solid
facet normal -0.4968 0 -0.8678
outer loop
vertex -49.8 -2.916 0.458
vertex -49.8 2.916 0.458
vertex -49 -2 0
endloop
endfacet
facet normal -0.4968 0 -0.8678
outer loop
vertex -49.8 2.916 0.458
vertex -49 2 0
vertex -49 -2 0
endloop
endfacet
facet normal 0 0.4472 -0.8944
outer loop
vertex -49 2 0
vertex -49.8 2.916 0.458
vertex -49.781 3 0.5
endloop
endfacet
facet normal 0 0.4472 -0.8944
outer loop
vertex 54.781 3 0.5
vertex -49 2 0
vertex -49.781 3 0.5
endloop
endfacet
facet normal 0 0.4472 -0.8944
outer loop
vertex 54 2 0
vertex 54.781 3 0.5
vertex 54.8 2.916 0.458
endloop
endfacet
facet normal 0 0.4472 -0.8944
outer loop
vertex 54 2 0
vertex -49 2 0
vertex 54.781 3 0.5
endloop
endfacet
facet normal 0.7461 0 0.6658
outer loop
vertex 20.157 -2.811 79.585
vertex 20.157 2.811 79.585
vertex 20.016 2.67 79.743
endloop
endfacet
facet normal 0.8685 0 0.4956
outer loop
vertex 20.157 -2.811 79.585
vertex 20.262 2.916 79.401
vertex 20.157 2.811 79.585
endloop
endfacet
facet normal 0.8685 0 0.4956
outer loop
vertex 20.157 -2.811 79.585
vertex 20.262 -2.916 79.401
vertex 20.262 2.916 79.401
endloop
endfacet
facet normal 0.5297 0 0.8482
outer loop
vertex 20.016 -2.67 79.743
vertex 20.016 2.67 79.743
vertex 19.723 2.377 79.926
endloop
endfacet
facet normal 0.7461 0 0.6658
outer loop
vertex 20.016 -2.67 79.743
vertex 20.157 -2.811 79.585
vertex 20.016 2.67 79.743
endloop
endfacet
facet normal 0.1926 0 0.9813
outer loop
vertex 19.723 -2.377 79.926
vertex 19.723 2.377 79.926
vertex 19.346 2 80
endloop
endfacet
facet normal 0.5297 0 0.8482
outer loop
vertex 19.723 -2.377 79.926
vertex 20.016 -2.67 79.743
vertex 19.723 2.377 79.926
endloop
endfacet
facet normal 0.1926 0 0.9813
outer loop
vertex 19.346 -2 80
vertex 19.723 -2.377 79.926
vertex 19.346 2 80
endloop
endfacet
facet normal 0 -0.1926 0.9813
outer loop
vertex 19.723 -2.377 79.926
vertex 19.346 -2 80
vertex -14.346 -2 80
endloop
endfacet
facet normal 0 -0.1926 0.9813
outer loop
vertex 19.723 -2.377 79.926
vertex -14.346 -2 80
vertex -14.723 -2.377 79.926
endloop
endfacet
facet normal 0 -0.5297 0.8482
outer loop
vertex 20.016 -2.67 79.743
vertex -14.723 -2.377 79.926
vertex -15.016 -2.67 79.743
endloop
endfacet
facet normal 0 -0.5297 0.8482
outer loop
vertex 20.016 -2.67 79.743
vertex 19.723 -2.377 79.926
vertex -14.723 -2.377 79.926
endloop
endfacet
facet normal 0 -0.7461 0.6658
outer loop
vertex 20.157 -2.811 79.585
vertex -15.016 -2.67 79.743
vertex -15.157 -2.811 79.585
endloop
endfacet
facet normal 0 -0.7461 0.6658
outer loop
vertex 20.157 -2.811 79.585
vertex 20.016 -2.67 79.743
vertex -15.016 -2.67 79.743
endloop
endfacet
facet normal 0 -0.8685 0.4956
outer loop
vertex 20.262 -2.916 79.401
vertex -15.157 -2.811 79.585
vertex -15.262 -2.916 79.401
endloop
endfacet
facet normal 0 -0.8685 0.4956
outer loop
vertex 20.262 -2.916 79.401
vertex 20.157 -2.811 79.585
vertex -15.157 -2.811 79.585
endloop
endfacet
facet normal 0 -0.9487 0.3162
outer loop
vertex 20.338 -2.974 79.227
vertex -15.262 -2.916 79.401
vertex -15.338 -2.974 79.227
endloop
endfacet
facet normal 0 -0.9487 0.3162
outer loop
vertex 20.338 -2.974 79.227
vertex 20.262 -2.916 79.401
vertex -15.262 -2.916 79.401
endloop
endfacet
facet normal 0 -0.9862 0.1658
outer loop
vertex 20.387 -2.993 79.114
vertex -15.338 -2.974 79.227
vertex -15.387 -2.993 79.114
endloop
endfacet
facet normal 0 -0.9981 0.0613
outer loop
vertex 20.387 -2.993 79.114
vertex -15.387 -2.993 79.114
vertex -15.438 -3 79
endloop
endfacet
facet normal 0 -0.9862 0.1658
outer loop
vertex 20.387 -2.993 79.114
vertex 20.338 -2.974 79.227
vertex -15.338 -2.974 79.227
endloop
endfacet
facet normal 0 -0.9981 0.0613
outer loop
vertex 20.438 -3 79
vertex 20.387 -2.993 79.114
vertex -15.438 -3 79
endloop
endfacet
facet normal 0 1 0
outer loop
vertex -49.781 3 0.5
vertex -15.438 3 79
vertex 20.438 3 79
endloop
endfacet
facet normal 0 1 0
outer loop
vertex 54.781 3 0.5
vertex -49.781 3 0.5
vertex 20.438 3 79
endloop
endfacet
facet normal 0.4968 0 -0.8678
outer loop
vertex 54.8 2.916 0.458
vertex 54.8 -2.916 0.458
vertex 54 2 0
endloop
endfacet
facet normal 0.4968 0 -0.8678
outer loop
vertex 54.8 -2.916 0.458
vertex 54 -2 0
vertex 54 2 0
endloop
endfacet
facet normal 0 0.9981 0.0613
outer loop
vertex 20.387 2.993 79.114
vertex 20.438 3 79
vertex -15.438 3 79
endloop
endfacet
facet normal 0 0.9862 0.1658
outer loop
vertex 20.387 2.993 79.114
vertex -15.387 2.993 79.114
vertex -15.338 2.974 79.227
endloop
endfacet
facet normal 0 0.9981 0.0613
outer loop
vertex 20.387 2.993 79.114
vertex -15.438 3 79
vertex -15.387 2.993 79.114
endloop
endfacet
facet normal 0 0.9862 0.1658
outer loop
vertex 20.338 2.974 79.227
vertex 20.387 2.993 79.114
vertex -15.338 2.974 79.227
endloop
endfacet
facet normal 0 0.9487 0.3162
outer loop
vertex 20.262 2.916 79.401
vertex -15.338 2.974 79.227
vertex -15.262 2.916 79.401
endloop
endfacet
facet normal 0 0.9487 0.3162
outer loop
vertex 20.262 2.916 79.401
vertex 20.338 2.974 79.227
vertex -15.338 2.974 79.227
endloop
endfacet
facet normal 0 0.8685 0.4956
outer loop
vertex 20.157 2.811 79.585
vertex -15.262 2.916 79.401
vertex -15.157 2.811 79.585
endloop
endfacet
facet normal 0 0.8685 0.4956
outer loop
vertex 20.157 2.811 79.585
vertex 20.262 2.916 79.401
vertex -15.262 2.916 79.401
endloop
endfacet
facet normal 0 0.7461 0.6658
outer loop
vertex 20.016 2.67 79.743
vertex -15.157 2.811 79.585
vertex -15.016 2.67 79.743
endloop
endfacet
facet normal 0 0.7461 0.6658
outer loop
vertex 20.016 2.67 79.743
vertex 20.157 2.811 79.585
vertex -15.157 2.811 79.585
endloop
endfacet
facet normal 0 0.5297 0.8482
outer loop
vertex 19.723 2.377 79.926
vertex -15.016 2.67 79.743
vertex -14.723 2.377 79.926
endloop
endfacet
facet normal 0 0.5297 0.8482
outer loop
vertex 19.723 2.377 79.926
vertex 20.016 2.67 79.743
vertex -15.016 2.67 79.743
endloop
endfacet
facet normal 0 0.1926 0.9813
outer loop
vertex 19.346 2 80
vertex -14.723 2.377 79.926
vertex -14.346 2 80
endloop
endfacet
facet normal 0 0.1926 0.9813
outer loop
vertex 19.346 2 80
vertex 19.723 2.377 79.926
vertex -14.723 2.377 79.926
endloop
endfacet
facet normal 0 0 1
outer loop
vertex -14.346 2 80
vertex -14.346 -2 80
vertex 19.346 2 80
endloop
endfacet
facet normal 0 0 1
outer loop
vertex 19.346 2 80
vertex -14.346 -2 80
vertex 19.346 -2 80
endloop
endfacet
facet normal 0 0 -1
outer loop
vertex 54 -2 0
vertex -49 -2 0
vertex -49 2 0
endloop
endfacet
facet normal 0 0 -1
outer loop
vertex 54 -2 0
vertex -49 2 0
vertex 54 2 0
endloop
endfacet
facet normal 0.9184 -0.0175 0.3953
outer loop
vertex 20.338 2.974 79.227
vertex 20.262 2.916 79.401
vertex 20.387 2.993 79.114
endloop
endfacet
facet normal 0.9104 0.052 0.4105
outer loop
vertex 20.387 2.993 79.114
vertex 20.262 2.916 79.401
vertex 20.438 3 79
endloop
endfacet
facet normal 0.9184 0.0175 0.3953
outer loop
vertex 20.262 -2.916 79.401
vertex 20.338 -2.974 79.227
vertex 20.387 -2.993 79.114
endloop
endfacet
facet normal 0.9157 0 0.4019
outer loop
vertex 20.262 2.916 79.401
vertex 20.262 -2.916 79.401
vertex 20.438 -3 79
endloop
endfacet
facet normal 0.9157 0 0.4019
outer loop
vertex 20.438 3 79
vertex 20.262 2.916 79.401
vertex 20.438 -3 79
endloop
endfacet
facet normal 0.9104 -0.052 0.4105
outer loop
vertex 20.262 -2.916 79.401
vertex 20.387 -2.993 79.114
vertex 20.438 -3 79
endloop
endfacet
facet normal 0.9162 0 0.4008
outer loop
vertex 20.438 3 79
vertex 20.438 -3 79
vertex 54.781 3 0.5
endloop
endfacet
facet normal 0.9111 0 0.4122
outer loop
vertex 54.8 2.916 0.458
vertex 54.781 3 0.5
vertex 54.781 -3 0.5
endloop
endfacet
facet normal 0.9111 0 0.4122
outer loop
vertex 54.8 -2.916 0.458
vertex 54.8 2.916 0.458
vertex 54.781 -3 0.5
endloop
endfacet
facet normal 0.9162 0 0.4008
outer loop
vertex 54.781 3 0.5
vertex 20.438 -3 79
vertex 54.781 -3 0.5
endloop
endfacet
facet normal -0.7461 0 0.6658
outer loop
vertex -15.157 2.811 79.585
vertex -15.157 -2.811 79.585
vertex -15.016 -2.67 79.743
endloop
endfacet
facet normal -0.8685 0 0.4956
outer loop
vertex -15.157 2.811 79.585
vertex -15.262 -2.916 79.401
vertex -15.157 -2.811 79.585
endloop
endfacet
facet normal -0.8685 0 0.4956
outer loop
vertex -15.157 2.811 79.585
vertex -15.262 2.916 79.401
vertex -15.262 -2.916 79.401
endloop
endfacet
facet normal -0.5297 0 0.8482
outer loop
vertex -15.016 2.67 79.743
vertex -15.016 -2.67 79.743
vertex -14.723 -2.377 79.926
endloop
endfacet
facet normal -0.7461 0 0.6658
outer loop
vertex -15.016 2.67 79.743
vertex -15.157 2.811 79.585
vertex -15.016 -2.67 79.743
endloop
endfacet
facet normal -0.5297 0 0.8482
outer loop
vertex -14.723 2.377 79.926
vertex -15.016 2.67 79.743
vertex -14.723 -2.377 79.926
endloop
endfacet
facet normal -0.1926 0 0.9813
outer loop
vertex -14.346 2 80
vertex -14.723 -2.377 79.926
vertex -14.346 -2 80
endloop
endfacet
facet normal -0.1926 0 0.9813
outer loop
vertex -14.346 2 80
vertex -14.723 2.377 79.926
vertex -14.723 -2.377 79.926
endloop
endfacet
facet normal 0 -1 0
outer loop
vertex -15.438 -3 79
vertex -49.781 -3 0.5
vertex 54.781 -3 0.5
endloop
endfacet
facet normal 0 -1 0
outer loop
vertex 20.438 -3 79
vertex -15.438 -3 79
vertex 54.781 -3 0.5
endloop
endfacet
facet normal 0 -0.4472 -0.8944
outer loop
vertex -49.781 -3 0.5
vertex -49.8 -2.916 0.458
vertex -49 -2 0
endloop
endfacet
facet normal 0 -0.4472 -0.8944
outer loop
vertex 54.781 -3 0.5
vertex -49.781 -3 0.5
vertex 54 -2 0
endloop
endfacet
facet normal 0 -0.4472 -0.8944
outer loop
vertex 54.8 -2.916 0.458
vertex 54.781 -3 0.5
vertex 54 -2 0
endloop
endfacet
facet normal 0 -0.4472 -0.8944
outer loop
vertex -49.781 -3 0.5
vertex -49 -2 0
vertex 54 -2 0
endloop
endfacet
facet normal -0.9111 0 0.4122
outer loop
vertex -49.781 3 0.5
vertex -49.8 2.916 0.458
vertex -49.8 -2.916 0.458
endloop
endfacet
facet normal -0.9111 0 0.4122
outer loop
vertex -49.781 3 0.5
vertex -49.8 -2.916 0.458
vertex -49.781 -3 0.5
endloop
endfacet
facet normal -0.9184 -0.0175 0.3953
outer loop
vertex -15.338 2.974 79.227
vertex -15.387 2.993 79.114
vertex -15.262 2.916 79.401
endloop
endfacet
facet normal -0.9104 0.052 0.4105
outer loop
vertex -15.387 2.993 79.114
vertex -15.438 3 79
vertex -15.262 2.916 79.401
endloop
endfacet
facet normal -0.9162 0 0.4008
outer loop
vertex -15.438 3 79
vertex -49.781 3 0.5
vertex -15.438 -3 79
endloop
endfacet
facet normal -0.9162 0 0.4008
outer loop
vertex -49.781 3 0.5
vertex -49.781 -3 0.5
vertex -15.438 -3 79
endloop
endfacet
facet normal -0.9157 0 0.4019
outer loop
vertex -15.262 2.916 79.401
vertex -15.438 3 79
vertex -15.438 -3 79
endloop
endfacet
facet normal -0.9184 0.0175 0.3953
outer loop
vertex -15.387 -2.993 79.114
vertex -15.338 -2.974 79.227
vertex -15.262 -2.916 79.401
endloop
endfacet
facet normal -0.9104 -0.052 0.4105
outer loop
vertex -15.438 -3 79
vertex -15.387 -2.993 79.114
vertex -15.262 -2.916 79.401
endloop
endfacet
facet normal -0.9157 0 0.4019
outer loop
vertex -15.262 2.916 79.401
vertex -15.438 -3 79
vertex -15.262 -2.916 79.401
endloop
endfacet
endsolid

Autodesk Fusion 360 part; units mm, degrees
sketch "Sketch1" plane through (0, 0, 0) normal (0, 1, 0) x (1, 0, 0)
  line L0 (-50, 0) -> (55, 0)
  line L1 (-15, -80) -> (20, -80)
  line L2 (-50, 0) -> (-15, -80)
  line L3 (20, -80) -> (55, 0)
  dimension "d2" = 105
  dimension "d3" = 35
  dimension "d4" = 35
  dimension "d5" = 80
  dimension "d6" = 50
extrude "Extrude1" add sketch "Sketch1" along normal mid plane 6
fillet "Fillet1" radius 1 4 edges at (2.5, -3, 80) (2.5, 3, 80) (-15, 0, 80) (20, 0, 80)
chamfer "Chamfer1" distance 0.5 distance2 1 4 edges at (2.5, -3, 0) (2.5, 3, 0) (-50, 0, 0) (55, 0, 0) measured on face at (-3.4792, -3, 26.3333) measured on face at (-3.4792, 3, 26.3333) measured on face at (-26.9583, 1, 52.6667) measured on face at (31.9583, -1, 52.6667)
